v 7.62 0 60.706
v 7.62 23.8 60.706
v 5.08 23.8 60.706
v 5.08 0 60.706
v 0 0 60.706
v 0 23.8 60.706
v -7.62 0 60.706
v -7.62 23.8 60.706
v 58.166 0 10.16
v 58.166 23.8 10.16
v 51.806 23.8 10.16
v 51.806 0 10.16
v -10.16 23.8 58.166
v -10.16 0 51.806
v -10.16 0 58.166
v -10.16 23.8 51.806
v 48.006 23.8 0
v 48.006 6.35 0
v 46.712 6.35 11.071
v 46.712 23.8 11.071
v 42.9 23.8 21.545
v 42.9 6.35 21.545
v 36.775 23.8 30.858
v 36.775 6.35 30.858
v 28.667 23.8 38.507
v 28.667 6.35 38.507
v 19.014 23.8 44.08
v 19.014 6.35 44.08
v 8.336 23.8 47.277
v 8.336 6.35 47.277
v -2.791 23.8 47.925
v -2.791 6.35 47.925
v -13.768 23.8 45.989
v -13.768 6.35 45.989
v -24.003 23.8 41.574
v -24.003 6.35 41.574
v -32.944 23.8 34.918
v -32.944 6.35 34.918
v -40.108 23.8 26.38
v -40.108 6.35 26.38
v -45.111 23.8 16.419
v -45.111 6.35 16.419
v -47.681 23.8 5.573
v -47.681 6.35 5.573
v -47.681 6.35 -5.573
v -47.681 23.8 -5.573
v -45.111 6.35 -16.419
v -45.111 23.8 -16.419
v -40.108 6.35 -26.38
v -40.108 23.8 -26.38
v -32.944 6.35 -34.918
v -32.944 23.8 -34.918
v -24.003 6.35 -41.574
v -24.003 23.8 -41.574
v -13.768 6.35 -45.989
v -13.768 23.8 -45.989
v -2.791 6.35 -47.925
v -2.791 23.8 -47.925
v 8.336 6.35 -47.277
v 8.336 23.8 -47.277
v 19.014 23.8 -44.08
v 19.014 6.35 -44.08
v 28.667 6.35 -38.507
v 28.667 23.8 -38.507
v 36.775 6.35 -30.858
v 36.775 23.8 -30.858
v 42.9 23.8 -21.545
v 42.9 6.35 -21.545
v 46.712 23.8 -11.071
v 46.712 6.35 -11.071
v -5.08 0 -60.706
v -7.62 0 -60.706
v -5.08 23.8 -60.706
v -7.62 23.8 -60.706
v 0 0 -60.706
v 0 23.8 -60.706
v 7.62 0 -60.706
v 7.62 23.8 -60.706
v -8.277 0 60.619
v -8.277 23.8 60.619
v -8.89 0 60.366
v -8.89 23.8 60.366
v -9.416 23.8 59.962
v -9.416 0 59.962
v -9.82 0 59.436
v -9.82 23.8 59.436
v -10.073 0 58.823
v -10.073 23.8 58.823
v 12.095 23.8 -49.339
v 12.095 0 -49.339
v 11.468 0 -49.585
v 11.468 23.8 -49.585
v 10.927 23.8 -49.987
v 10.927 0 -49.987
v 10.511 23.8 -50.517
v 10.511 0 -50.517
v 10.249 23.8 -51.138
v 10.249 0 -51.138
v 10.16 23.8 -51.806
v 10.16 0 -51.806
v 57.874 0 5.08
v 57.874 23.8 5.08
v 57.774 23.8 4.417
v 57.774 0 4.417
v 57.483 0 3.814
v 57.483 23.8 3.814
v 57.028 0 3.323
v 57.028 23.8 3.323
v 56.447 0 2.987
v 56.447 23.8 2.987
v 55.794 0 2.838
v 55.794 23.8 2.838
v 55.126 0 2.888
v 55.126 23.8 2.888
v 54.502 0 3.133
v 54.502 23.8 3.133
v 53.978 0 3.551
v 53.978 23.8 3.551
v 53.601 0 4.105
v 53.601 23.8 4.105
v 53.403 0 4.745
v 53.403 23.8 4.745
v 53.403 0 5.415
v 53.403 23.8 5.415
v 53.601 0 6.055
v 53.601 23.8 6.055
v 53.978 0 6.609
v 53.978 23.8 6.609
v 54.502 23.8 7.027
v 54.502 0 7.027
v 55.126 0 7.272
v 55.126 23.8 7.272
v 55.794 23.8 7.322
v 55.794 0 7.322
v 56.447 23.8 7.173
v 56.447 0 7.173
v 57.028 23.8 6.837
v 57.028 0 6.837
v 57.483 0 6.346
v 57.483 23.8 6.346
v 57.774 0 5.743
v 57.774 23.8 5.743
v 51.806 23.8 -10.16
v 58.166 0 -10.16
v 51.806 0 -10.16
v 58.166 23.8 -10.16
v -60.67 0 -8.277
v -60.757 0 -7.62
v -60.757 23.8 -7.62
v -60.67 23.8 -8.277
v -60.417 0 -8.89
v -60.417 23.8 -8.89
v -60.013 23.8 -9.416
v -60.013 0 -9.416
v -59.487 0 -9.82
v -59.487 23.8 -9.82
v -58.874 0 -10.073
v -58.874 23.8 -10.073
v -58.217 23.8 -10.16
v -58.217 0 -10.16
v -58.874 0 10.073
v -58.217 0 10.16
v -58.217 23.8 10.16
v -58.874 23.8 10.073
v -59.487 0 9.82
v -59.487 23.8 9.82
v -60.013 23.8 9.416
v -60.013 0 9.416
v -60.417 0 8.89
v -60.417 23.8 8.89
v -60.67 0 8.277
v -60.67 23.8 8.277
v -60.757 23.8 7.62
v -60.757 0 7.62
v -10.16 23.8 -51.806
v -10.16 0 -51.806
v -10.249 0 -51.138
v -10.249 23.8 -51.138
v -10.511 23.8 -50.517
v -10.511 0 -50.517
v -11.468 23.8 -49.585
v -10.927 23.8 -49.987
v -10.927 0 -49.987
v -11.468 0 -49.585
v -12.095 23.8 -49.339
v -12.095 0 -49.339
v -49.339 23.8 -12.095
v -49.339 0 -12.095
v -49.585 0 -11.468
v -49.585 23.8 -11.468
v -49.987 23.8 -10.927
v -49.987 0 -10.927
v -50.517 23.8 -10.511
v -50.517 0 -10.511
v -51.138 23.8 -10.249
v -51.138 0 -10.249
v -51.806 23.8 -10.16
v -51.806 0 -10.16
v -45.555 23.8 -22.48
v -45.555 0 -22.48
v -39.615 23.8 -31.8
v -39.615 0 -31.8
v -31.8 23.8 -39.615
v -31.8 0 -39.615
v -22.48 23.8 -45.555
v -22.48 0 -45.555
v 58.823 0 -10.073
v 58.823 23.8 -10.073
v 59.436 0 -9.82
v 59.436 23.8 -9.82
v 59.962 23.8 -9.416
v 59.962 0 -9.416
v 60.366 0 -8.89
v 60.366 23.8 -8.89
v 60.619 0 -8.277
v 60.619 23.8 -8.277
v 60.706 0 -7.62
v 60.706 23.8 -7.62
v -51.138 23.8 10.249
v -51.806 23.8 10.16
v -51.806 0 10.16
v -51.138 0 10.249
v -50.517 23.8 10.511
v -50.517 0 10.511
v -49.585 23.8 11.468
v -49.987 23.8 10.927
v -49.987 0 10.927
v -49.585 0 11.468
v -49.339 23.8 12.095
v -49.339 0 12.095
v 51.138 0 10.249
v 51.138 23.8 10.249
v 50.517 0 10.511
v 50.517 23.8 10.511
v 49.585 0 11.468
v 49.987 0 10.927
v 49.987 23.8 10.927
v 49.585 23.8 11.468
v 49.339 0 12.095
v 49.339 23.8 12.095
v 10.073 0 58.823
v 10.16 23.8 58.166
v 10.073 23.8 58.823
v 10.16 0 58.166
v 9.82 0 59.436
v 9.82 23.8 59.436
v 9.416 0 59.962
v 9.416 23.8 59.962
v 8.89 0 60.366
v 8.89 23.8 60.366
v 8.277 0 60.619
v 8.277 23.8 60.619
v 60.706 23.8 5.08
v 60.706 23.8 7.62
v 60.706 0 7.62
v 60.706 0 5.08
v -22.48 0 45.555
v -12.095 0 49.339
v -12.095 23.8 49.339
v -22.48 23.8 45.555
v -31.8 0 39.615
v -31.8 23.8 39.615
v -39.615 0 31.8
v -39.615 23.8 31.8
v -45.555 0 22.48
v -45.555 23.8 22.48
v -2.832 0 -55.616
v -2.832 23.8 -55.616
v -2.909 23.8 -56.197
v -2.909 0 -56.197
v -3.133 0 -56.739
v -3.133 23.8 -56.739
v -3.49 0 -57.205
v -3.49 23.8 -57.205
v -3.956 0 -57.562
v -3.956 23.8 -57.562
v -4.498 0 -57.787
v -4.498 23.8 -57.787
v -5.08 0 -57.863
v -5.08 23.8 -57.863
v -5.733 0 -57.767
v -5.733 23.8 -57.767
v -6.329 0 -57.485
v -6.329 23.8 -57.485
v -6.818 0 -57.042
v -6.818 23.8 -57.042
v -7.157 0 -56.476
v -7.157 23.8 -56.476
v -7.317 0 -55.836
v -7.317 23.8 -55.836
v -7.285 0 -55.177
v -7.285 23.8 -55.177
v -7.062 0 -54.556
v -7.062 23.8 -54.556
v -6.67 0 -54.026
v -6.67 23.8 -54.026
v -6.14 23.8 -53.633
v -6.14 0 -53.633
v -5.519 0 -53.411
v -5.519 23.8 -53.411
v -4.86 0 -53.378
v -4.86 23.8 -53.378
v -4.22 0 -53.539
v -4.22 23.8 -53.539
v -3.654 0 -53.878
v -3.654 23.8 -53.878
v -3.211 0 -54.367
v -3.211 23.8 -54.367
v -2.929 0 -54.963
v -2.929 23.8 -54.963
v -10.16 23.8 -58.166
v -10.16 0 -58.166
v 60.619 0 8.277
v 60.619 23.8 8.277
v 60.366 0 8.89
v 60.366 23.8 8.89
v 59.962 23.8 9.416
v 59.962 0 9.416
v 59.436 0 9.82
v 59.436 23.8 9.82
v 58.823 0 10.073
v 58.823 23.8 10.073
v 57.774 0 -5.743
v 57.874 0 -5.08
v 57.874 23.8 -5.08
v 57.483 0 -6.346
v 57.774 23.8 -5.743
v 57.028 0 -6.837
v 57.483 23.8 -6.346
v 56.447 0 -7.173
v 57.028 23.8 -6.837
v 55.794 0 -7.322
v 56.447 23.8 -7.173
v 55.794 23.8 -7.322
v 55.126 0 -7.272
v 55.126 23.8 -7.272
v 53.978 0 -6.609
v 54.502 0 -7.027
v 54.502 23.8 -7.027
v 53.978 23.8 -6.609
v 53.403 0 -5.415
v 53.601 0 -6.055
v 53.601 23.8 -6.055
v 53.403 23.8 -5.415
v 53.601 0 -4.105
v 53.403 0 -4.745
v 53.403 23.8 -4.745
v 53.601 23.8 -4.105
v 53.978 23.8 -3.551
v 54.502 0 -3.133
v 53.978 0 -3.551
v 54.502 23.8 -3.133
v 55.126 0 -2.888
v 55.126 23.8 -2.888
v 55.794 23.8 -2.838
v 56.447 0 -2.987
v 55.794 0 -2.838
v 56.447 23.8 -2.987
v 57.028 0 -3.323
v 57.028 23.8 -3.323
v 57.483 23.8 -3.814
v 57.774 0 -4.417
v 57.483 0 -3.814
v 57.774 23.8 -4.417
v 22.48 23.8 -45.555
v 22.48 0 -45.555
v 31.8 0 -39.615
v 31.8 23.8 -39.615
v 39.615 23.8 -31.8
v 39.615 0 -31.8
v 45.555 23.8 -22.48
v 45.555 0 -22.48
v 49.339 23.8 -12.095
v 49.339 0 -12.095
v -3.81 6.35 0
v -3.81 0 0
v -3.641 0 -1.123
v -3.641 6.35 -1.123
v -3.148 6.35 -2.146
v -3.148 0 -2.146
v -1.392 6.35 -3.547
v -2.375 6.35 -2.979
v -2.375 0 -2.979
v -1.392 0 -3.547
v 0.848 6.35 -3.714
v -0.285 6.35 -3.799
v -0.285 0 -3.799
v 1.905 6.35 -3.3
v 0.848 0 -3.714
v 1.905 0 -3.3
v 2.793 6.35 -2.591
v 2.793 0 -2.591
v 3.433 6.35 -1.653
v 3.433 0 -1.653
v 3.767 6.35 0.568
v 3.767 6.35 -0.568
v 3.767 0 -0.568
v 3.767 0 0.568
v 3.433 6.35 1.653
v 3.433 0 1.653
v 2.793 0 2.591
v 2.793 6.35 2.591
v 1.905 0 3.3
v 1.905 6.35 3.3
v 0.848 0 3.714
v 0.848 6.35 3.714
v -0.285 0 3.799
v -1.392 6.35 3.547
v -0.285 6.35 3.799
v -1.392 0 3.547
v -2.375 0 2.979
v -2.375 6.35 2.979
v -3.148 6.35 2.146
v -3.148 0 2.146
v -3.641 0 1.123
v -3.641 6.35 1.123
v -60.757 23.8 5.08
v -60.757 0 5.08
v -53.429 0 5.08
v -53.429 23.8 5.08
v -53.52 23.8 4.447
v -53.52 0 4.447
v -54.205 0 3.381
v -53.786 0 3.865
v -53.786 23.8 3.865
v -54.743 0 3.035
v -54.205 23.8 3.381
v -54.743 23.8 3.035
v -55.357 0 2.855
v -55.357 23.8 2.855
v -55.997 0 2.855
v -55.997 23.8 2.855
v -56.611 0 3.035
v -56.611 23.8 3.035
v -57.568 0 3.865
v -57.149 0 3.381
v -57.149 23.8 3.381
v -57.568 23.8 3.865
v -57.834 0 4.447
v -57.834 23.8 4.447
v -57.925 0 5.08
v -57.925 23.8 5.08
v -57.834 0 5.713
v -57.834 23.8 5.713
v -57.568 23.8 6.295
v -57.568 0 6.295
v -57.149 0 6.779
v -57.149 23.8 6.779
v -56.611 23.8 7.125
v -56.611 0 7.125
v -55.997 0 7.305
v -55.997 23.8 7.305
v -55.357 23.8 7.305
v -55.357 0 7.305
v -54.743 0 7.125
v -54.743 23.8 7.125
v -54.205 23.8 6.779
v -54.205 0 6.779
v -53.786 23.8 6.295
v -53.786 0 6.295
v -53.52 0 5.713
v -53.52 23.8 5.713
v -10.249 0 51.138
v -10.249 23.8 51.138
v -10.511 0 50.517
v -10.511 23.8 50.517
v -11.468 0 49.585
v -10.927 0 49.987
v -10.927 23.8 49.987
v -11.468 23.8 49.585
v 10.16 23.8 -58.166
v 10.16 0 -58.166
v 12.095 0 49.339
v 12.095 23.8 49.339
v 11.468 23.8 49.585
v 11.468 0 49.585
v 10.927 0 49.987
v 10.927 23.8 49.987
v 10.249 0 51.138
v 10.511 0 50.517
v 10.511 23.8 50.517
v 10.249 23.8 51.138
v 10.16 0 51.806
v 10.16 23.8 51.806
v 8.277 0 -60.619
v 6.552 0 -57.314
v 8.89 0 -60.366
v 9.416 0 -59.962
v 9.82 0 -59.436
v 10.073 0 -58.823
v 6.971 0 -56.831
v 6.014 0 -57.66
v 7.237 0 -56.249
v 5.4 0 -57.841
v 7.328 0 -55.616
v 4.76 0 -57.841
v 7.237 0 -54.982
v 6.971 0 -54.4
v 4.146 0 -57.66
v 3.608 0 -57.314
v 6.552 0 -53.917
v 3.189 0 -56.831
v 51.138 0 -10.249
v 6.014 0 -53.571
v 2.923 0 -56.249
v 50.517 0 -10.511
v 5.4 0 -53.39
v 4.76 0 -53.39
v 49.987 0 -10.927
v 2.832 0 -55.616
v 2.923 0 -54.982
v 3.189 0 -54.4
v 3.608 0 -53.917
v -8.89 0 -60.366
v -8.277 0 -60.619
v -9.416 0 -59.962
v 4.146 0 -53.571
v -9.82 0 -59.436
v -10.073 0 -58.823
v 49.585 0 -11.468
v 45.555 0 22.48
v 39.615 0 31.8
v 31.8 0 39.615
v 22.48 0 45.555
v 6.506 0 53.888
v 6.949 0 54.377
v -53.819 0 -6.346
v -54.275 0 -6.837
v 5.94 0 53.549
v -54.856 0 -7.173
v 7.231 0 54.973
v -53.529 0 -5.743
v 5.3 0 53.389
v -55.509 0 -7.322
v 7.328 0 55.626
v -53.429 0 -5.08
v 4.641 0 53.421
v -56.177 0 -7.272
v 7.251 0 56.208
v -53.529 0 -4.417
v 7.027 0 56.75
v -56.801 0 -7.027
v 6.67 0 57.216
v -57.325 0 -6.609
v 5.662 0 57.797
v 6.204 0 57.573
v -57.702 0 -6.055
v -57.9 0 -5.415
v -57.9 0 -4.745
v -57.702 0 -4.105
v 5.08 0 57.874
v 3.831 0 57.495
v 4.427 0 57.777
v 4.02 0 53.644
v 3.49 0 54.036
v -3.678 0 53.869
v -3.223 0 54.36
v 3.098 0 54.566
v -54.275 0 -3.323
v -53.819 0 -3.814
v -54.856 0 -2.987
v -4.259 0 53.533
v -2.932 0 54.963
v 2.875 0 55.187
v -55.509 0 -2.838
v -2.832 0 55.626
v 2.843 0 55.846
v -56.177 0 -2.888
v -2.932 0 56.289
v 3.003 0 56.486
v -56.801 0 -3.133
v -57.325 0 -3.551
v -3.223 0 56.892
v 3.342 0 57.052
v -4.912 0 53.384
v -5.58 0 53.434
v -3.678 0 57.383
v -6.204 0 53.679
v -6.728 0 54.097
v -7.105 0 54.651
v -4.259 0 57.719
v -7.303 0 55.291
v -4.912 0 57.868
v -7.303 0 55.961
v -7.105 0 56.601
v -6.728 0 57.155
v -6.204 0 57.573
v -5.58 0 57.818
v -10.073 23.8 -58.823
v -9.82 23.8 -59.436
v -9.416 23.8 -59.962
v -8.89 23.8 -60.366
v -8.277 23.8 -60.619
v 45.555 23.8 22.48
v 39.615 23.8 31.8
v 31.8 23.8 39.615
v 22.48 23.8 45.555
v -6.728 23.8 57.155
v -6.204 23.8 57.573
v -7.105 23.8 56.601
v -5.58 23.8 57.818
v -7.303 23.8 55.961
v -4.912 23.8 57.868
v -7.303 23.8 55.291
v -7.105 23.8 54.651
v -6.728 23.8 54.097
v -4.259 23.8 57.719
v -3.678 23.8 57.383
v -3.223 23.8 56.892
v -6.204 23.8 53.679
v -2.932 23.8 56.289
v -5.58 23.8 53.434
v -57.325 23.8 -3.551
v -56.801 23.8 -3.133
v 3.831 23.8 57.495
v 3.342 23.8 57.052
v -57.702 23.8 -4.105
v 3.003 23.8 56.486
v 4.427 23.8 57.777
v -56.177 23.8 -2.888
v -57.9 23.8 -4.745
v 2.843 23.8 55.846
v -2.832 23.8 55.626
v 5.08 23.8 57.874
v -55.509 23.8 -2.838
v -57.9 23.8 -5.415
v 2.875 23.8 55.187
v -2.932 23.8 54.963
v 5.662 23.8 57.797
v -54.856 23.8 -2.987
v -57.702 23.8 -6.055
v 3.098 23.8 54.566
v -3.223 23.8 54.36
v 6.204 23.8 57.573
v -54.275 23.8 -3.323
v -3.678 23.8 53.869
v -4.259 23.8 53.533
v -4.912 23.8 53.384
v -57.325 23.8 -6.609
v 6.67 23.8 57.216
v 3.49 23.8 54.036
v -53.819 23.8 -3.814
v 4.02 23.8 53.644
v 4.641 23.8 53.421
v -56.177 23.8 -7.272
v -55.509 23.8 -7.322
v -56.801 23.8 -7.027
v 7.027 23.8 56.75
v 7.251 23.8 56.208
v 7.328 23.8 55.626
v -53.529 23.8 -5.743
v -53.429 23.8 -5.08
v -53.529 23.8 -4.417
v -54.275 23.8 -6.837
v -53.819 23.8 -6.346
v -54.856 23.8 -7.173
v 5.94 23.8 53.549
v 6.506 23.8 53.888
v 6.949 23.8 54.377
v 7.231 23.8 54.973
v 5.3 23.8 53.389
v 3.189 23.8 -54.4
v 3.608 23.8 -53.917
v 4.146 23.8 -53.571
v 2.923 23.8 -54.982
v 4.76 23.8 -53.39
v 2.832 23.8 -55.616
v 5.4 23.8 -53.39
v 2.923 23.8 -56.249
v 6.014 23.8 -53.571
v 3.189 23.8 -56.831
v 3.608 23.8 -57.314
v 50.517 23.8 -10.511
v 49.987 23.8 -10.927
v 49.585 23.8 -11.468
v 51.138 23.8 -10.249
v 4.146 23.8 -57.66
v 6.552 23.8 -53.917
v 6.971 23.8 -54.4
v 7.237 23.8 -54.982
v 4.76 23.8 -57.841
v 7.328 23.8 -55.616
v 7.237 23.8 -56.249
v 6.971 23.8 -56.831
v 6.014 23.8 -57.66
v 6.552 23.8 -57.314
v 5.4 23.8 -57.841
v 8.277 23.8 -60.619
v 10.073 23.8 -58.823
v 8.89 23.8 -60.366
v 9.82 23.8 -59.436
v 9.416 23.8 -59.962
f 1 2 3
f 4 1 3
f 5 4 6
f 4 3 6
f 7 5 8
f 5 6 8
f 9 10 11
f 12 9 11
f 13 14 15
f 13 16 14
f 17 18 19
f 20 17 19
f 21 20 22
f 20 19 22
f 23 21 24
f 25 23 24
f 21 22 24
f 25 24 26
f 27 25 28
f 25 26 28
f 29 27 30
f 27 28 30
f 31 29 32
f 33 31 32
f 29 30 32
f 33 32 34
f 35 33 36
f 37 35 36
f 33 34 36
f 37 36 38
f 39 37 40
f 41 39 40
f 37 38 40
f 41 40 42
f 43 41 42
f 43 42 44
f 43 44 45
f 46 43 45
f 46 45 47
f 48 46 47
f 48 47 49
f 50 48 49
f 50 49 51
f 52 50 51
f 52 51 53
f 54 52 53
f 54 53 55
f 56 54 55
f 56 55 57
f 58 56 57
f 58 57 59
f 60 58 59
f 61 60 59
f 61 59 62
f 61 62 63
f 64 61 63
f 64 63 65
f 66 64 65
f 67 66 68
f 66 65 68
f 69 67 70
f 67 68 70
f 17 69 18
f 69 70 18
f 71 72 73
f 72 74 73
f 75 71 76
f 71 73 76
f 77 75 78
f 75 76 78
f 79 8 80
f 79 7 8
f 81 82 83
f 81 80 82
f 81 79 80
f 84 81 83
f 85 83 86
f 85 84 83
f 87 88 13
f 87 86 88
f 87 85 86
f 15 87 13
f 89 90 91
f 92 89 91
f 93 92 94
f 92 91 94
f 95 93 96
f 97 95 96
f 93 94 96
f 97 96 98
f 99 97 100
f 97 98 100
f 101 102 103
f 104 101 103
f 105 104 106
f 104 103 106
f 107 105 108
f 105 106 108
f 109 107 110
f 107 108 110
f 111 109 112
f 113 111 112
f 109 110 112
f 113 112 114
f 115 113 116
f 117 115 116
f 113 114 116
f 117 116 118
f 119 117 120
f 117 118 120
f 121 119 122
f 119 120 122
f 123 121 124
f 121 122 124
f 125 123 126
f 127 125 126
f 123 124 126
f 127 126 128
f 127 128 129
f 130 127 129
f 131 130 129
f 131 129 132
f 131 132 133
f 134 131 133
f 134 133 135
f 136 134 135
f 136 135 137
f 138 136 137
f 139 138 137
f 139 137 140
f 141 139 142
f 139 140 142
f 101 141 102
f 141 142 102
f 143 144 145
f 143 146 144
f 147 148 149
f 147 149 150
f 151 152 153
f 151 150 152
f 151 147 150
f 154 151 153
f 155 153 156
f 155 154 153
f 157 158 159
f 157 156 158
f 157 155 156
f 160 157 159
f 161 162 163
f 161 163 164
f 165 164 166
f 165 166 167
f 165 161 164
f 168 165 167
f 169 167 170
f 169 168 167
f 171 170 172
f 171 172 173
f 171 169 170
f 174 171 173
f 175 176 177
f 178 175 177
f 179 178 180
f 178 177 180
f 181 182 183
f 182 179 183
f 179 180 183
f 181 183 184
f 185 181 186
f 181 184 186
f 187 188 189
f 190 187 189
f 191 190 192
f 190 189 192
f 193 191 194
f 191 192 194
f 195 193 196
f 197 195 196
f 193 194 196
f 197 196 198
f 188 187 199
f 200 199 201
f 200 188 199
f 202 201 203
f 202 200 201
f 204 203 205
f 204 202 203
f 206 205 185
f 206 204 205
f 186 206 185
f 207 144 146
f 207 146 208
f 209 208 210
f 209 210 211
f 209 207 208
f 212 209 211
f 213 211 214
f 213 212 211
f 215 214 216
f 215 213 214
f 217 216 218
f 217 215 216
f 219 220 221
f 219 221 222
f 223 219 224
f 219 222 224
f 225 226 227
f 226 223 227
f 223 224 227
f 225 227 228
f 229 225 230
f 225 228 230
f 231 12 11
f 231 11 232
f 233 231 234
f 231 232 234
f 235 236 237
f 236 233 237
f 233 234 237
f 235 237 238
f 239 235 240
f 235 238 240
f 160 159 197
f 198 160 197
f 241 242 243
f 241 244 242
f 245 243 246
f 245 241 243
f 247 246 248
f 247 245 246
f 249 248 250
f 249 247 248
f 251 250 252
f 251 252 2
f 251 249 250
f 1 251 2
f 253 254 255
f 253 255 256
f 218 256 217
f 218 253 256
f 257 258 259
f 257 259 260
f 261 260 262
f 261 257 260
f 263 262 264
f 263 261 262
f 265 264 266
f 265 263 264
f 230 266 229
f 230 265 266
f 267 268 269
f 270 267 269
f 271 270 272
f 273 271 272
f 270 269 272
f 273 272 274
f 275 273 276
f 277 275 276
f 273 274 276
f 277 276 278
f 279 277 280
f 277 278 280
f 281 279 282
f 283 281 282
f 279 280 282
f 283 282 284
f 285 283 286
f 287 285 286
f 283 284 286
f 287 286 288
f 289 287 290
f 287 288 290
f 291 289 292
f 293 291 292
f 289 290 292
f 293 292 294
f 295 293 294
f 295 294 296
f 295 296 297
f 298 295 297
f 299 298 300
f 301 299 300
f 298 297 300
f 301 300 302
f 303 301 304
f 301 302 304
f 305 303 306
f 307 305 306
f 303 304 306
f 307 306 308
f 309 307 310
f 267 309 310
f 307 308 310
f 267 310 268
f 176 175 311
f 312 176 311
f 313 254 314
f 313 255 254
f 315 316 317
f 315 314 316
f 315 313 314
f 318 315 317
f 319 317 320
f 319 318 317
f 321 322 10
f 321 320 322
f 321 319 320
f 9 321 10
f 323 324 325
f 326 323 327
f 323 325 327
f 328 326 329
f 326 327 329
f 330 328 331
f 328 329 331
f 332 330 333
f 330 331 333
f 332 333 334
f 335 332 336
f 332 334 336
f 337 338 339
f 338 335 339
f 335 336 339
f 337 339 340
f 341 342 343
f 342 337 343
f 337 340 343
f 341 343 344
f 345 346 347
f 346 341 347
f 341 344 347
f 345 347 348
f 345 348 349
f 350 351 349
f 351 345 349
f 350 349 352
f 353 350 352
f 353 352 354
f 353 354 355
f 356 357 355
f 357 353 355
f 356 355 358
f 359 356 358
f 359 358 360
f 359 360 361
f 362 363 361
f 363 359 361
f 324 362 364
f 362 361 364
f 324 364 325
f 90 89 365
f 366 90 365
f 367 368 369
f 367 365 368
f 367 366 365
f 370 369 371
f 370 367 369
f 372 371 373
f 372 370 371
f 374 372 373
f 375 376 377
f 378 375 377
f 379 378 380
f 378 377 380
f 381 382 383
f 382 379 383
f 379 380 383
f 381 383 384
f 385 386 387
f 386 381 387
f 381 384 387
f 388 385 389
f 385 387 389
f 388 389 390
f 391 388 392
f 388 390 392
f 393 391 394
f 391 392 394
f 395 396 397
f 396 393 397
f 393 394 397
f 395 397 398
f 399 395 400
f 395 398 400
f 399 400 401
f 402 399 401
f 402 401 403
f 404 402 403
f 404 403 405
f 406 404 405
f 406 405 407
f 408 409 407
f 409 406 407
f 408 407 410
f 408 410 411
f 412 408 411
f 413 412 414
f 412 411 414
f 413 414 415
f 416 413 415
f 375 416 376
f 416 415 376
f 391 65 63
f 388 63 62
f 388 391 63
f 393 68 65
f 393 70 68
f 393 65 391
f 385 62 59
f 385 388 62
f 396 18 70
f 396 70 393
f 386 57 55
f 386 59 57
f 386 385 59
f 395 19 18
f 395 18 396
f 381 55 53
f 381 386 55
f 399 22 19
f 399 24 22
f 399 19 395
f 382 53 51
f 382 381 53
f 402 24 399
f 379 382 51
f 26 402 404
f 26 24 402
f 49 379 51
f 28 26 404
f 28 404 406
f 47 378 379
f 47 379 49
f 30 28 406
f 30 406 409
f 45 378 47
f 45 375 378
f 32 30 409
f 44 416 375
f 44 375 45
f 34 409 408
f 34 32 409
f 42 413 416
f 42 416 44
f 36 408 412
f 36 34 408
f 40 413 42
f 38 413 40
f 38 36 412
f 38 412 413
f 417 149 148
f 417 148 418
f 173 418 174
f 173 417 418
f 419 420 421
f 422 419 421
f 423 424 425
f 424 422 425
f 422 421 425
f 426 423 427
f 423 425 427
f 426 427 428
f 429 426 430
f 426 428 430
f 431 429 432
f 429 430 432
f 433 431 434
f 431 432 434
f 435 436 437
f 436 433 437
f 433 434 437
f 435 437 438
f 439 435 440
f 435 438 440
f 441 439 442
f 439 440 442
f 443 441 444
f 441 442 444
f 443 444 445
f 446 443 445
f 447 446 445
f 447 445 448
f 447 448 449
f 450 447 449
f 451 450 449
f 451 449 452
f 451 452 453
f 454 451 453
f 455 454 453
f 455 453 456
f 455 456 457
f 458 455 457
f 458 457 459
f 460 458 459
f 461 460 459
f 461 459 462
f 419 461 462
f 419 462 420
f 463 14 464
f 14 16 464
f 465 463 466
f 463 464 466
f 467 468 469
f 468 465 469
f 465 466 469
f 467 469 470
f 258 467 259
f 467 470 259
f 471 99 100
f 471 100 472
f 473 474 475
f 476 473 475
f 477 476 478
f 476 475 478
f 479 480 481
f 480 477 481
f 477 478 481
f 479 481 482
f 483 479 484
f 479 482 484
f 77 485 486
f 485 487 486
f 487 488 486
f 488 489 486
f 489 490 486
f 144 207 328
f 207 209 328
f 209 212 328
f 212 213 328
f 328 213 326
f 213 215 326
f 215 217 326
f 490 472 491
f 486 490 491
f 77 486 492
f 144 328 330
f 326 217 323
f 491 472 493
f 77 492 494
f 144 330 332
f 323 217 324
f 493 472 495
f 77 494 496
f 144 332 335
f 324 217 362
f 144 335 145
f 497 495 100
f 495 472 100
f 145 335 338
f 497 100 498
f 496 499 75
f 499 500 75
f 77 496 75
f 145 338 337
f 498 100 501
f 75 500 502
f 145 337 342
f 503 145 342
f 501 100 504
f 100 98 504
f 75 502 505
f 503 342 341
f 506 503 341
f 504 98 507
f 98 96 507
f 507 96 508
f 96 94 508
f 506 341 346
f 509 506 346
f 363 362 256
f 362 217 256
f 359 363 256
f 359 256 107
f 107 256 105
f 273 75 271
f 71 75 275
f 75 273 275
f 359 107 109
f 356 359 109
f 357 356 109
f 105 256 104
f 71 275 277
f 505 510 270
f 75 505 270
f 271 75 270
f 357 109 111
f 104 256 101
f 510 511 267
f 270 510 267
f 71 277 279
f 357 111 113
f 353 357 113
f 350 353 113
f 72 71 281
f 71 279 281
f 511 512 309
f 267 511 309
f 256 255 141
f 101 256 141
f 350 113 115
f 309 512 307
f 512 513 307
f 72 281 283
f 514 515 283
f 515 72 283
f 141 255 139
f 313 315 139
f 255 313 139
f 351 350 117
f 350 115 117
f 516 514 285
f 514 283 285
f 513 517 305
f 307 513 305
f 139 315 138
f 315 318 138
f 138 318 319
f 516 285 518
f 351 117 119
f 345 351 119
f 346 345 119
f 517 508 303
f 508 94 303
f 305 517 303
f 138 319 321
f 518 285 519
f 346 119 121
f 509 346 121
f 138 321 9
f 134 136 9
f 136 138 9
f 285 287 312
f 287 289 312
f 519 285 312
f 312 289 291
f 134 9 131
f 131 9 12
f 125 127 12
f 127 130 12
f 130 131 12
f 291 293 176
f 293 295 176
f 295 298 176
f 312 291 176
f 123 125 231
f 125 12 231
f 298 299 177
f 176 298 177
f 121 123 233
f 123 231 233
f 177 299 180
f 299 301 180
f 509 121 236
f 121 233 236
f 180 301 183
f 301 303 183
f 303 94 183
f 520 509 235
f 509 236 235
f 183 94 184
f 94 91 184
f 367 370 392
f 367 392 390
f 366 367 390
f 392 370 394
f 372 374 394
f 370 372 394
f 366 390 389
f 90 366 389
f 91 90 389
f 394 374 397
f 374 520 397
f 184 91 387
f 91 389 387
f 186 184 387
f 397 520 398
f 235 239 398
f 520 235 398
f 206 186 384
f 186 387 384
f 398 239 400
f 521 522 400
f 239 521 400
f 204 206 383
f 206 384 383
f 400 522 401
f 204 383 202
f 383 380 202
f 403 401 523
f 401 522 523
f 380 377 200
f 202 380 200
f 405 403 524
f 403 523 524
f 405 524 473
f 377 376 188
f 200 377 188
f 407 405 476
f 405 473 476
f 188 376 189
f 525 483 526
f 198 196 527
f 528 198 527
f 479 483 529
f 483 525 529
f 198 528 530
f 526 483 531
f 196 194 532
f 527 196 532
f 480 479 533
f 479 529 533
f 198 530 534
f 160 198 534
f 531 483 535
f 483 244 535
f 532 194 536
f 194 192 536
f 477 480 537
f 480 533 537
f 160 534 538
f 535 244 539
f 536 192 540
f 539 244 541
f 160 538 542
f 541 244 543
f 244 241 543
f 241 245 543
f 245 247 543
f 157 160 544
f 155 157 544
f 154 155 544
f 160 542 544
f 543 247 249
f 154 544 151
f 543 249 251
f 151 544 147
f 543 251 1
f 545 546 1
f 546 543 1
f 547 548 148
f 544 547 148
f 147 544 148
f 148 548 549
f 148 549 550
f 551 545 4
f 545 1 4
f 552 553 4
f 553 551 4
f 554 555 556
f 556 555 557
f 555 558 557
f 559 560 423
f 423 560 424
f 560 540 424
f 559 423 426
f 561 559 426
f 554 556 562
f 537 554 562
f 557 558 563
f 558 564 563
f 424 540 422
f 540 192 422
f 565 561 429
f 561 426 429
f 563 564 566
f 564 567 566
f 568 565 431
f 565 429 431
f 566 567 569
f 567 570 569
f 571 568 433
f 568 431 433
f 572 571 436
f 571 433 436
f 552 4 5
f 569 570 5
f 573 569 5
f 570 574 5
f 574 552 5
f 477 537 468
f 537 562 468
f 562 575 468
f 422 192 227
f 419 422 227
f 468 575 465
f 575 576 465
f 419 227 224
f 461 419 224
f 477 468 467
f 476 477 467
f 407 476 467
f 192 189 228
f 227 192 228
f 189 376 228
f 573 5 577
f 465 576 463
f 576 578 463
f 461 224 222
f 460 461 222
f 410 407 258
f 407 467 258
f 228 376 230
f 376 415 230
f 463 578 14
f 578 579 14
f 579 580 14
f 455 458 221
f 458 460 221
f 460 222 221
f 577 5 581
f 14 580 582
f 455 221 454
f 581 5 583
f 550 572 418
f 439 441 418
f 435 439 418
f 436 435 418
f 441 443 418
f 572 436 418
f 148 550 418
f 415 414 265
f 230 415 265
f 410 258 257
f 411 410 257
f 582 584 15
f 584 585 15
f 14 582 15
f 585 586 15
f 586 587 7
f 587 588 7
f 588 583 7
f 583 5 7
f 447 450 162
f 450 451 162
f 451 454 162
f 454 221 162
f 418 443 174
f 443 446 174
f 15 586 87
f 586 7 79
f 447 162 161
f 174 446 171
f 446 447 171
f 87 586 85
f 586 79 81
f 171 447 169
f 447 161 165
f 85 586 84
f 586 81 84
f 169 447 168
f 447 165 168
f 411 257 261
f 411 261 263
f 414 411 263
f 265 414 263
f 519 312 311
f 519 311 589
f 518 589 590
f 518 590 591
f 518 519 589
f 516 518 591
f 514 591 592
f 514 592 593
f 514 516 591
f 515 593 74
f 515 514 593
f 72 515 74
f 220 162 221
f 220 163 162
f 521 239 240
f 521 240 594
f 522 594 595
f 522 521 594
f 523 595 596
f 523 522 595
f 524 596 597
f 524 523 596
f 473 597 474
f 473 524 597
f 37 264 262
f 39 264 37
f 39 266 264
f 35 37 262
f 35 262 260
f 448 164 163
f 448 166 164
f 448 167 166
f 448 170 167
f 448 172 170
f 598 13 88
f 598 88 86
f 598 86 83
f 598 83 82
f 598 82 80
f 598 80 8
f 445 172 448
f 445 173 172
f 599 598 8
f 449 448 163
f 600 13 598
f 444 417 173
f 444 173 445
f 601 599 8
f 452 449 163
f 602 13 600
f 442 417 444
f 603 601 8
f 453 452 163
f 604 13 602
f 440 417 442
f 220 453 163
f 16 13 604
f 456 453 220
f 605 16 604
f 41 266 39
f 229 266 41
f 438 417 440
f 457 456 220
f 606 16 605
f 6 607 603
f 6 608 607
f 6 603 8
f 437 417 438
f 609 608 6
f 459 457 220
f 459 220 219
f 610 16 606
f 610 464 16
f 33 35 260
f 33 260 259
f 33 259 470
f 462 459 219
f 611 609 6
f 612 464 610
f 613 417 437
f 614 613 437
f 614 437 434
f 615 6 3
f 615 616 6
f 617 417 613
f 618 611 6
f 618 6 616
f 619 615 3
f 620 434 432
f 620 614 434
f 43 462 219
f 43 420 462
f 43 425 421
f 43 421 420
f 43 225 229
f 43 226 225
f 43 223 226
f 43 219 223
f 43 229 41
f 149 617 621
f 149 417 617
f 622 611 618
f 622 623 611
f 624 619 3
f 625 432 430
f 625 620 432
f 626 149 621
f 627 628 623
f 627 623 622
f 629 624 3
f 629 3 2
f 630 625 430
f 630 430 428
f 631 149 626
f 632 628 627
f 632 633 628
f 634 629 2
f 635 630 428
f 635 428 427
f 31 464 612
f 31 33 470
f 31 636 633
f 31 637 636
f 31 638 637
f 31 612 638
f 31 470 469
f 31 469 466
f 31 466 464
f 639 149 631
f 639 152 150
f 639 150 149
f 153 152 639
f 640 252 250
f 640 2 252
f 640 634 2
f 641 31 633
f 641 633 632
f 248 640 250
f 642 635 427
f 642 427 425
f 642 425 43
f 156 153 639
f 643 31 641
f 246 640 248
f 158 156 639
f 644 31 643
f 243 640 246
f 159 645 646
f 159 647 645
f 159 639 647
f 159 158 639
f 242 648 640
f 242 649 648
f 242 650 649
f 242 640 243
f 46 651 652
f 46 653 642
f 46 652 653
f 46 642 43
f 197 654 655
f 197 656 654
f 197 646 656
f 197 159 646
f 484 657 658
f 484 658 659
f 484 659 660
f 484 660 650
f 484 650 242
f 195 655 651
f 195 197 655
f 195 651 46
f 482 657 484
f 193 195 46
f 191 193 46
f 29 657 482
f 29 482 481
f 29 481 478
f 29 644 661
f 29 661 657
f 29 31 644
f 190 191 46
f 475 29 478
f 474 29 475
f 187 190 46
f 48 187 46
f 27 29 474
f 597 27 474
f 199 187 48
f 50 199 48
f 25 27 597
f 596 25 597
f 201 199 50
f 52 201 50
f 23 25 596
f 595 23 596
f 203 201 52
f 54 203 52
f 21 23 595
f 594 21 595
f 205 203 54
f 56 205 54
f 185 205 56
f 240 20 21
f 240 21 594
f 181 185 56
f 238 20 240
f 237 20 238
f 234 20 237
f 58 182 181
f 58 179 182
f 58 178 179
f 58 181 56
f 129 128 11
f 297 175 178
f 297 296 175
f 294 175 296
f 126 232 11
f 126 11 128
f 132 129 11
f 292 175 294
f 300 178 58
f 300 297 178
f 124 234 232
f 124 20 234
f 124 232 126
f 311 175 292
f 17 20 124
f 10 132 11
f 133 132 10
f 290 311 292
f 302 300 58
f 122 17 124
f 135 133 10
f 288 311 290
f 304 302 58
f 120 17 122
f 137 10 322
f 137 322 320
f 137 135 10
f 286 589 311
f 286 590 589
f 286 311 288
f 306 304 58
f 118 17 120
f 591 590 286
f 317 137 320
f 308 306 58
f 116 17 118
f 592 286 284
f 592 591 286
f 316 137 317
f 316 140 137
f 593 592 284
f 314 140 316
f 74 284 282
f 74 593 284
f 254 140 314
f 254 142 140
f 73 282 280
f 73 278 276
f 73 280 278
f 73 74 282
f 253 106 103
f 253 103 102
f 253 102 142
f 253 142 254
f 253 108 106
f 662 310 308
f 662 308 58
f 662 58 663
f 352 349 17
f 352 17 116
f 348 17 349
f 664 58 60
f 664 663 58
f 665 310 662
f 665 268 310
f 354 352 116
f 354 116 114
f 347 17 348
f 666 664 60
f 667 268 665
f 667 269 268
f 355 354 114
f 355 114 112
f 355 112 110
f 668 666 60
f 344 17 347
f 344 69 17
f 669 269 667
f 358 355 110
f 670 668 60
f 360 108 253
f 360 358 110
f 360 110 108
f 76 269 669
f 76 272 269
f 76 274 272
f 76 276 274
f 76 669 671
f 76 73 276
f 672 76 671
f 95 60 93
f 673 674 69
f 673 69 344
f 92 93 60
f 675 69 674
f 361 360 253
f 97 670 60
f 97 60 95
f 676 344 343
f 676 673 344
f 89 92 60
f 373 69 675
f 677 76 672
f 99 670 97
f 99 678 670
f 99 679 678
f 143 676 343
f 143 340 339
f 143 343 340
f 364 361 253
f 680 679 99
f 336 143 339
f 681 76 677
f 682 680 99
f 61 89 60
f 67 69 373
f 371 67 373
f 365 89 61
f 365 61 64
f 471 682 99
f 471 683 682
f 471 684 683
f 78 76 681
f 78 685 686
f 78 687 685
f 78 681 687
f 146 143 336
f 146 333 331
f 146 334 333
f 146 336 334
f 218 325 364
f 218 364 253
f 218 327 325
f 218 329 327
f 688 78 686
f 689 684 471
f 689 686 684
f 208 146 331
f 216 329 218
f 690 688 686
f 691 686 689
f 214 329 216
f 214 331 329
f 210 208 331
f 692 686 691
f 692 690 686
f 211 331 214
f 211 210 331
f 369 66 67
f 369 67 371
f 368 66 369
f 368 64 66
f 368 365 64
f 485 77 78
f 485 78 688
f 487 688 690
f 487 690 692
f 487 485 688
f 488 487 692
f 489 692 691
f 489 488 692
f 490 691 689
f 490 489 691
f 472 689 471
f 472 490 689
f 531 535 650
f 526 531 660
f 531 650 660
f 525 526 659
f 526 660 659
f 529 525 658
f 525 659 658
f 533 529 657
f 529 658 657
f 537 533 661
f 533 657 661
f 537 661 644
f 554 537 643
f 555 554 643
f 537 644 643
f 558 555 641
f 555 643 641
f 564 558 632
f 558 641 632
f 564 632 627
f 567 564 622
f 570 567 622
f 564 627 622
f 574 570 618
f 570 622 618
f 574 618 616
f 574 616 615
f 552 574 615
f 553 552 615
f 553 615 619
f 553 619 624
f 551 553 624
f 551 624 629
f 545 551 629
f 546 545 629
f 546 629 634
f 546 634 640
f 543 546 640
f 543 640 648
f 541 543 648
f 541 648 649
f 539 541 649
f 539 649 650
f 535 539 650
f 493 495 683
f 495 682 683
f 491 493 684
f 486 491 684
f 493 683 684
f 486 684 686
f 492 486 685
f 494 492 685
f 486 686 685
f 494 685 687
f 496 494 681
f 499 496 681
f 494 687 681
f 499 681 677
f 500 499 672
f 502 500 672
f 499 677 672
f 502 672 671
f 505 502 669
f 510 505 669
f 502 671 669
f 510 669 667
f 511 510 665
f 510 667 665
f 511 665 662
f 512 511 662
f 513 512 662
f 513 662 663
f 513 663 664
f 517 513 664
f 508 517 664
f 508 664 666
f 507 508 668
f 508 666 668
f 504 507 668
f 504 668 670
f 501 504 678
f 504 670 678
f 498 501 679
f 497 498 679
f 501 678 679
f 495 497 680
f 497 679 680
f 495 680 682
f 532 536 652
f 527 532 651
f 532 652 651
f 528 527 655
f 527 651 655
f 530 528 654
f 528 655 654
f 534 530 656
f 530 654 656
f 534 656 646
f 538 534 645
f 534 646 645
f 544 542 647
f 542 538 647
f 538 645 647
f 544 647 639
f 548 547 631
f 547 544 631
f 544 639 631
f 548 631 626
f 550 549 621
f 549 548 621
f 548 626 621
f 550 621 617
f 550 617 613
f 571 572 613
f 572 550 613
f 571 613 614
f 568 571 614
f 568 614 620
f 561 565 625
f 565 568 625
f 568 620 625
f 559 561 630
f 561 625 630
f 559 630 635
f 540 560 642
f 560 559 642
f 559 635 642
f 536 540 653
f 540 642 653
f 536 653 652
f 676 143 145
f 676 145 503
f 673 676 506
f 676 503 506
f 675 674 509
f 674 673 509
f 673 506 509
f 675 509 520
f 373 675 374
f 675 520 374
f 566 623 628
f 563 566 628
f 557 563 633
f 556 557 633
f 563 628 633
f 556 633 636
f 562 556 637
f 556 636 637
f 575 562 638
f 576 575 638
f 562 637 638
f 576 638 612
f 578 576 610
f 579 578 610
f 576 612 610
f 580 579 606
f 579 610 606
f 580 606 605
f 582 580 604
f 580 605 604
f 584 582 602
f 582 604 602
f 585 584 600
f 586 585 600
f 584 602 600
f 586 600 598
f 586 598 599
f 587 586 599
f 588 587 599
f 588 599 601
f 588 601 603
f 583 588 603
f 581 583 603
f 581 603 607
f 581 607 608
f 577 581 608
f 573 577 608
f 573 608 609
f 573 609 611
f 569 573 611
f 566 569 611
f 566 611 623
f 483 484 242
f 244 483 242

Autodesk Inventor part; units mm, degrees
ref_plane "YZ Plane" through (0, 0, 0) normal (1, 0, 0) x (0, 1, 0)
ref_plane "XZ Plane" through (0, 0, 0) normal (0, 1, 0) x (-1, 0, 0)
ref_plane "XY Plane" through (0, 0, 0) normal (0, 0, 1) x (1, 0, 0)
sketch "Sketch1" plane through (0, 0, 0) normal (0, 1, 0) x (-1, 0, 0)
  circle A0 centre (0, 0) radius 50.8
  circle A1 centre (0, 0) radius 3.81
  dimension "d0" = 101.6
  dimension "d1" = 7.62
extrude "Extrusion1" add sketch "Sketch1" along normal blind 6.35
sketch "Sketch2" plane through (0, 6.35, 0) normal (0, 1, 0) x (1, 0, 0)
  circle A0 centre (0, 0) radius 3.81 projected
  circle A1 centre (0, 0) radius 50.8
  circle A2 centre (0, 0) radius 48.006
  dimension "d4" = 96.012
extrude "Extrusion2" add sketch "Sketch2" along normal blind 17.4498 contours A1
fillet "Fillet1" [suppressed]
sketch "Sketch3" plane through (0, 23.7998, 0) normal (0, 1, 0) x (1, 0, 0)
  circle A0 centre (0, 0) radius 48.006 projected
  line L0 (0, 48.006) -> (10.16, 48.006)
  line L1 (10.16, 48.006) -> (10.16, 60.706)
  line L2 (10.16, 60.706) -> (0, 60.706)
  line L3 (0, 60.706) -> (0, 55.6155)
  line L4 (0, 48.006) -> (-10.16, 48.006)
  line L5 (-10.16, 48.006) -> (-10.16, 60.706)
  line L6 (-10.16, 60.706) -> (0, 60.706)
  line L7 (0, 60.706) -> (0, 55.6155)
  line L8 (-55.6768, 0) -> (-60.7568, 0)
  line L9 (-60.7568, 0) -> (-60.7568, 10.16)
  line L10 (-60.7568, 10.16) -> (-48.0568, 10.16)
  line L11 (-48.0568, 10.16) -> (-48.0568, 0)
  line L12 (-55.6768, 0) -> (-60.7568, 0)
  line L13 (-60.7568, 0) -> (-60.7568, -10.16)
  line L14 (-60.7568, -10.16) -> (-48.0568, -10.16)
  line L15 (-48.0568, -10.16) -> (-48.0568, 0)
  line L16 (0, -48.006) -> (10.16, -48.006)
  line L17 (10.16, -48.006) -> (10.16, -60.706)
  line L18 (10.16, -60.706) -> (0, -60.706)
  line L19 (0, -60.706) -> (0, -55.626)
  line L20 (0, -48.006) -> (-10.16, -48.006)
  line L21 (-10.16, -48.006) -> (-10.16, -60.706)
  line L22 (-10.16, -60.706) -> (0, -60.706)
  line L23 (0, -60.706) -> (0, -55.626)
  line L24 (48.006, 0) -> (55.626, 0)
  line L25 (60.706, 0) -> (60.706, 10.16)
  line L26 (60.706, 10.16) -> (48.006, 10.16)
  line L27 (48.006, 10.16) -> (48.006, 0)
  line L28 (48.006, 0) -> (55.626, 0)
  line L29 (60.706, 0) -> (60.706, -10.16)
  line L30 (60.706, -10.16) -> (48.006, -10.16)
  line L31 (48.006, -10.16) -> (48.006, 0)
  line L32 (5.08, -60.706) -> (5.08, -57.8739)
  line L33 (60.706, -5.08) -> (57.8739, -5.08)
  line L34 (-60.7568, -5.08) -> (-57.9247, -5.08)
  line L35 (-5.08, 60.706) -> (-5.08, 55.6155)
  circle A1 centre (-5.08, 55.6155) radius 2.2479
  circle A2 centre (5.08, 55.6155) radius 2.2479
  circle A3 centre (55.626, 5.08) radius 2.2479
  circle A4 centre (55.626, -5.08) radius 2.2479
  circle A5 centre (5.08, -55.626) radius 2.2479
  circle A6 centre (-5.08, -55.626) radius 2.2479
  circle A7 centre (-55.6768, 5.08) radius 2.2479
  circle A8 centre (-55.6768, -5.08) radius 2.2479
  line L36 (-55.6768, -5.08) -> (-55.6768, -2.8321)
  line L37 (-55.6768, 2.8321) -> (-55.6768, 5.08)
  line L38 (0, 55.6155) -> (5.08, 55.6155)
  line L39 (55.626, -5.08) -> (55.626, -2.8321)
  line L40 (55.626, 2.8321) -> (55.626, 5.08)
  line L41 (5.08, -55.626) -> (2.8321, -55.626)
  line L42 (0, -55.626) -> (-5.08, -55.626)
  point P0 (0, -60.706)
  dimension "d25" = 4.4958
  dimension "d29" = 4.4958
  dimension "d8" = 10.16
  dimension "d9" = 12.7
  dimension "d10" = 12.7
  dimension "d11" = 10.16
  dimension "d12" = 10.16
  dimension "d13" = 10.16
  dimension "d14" = 12.7
  dimension "d15" = 10.16
  dimension "d16" = 10.16
  dimension "d17" = 12.7
  dimension "d18" = 10.16
  dimension "d19" = 10.16
  dimension "d20" = 5.08
  dimension "d21" = 5.08
  dimension "d22" = 5.08
  dimension "d23" = 4.4958
  dimension "d24" = 4.4958
  dimension "d26" = 4.4958
  dimension "d27" = 4.4958
  dimension "d28" = 4.4958
  dimension "d30" = 4.4958
extrude "Extrusion3" add sketch "Sketch3" against normal up to surface (23.7998 mm away) contours L16 L17 L18 L22 L21 L20 | L4 L5 L6 L2 L1 L0 | L27 L26 L25 L29 L30 L31 | L9 L10 L11 L15 L14 L13
fillet "Fillet2" radius 2.54 16 edges at (-49.7736, 11.8999, 10.16) (-60.7568, 11.8999, 10.16) (-60.7568, 11.8999, -10.16) (-49.7736, 11.8999, -10.16) (-10.16, 11.8999, -49.7736) (-10.16, 11.8999, -60.706) (10.16, 11.8999, -60.706) (10.16, 11.8999, -49.7736) (49.7736, 11.8999, -10.16) (60.706, 11.8999, -10.16) (60.706, 11.8999, 10.16) (49.7736, 11.8999, 10.16) (10.16, 11.8999, 49.7736) (10.16, 11.8999, 60.706) (-10.16, 11.8999, 60.706) (-10.16, 11.8999, 49.7736)
properties part number "RingCase_3DPrint"
